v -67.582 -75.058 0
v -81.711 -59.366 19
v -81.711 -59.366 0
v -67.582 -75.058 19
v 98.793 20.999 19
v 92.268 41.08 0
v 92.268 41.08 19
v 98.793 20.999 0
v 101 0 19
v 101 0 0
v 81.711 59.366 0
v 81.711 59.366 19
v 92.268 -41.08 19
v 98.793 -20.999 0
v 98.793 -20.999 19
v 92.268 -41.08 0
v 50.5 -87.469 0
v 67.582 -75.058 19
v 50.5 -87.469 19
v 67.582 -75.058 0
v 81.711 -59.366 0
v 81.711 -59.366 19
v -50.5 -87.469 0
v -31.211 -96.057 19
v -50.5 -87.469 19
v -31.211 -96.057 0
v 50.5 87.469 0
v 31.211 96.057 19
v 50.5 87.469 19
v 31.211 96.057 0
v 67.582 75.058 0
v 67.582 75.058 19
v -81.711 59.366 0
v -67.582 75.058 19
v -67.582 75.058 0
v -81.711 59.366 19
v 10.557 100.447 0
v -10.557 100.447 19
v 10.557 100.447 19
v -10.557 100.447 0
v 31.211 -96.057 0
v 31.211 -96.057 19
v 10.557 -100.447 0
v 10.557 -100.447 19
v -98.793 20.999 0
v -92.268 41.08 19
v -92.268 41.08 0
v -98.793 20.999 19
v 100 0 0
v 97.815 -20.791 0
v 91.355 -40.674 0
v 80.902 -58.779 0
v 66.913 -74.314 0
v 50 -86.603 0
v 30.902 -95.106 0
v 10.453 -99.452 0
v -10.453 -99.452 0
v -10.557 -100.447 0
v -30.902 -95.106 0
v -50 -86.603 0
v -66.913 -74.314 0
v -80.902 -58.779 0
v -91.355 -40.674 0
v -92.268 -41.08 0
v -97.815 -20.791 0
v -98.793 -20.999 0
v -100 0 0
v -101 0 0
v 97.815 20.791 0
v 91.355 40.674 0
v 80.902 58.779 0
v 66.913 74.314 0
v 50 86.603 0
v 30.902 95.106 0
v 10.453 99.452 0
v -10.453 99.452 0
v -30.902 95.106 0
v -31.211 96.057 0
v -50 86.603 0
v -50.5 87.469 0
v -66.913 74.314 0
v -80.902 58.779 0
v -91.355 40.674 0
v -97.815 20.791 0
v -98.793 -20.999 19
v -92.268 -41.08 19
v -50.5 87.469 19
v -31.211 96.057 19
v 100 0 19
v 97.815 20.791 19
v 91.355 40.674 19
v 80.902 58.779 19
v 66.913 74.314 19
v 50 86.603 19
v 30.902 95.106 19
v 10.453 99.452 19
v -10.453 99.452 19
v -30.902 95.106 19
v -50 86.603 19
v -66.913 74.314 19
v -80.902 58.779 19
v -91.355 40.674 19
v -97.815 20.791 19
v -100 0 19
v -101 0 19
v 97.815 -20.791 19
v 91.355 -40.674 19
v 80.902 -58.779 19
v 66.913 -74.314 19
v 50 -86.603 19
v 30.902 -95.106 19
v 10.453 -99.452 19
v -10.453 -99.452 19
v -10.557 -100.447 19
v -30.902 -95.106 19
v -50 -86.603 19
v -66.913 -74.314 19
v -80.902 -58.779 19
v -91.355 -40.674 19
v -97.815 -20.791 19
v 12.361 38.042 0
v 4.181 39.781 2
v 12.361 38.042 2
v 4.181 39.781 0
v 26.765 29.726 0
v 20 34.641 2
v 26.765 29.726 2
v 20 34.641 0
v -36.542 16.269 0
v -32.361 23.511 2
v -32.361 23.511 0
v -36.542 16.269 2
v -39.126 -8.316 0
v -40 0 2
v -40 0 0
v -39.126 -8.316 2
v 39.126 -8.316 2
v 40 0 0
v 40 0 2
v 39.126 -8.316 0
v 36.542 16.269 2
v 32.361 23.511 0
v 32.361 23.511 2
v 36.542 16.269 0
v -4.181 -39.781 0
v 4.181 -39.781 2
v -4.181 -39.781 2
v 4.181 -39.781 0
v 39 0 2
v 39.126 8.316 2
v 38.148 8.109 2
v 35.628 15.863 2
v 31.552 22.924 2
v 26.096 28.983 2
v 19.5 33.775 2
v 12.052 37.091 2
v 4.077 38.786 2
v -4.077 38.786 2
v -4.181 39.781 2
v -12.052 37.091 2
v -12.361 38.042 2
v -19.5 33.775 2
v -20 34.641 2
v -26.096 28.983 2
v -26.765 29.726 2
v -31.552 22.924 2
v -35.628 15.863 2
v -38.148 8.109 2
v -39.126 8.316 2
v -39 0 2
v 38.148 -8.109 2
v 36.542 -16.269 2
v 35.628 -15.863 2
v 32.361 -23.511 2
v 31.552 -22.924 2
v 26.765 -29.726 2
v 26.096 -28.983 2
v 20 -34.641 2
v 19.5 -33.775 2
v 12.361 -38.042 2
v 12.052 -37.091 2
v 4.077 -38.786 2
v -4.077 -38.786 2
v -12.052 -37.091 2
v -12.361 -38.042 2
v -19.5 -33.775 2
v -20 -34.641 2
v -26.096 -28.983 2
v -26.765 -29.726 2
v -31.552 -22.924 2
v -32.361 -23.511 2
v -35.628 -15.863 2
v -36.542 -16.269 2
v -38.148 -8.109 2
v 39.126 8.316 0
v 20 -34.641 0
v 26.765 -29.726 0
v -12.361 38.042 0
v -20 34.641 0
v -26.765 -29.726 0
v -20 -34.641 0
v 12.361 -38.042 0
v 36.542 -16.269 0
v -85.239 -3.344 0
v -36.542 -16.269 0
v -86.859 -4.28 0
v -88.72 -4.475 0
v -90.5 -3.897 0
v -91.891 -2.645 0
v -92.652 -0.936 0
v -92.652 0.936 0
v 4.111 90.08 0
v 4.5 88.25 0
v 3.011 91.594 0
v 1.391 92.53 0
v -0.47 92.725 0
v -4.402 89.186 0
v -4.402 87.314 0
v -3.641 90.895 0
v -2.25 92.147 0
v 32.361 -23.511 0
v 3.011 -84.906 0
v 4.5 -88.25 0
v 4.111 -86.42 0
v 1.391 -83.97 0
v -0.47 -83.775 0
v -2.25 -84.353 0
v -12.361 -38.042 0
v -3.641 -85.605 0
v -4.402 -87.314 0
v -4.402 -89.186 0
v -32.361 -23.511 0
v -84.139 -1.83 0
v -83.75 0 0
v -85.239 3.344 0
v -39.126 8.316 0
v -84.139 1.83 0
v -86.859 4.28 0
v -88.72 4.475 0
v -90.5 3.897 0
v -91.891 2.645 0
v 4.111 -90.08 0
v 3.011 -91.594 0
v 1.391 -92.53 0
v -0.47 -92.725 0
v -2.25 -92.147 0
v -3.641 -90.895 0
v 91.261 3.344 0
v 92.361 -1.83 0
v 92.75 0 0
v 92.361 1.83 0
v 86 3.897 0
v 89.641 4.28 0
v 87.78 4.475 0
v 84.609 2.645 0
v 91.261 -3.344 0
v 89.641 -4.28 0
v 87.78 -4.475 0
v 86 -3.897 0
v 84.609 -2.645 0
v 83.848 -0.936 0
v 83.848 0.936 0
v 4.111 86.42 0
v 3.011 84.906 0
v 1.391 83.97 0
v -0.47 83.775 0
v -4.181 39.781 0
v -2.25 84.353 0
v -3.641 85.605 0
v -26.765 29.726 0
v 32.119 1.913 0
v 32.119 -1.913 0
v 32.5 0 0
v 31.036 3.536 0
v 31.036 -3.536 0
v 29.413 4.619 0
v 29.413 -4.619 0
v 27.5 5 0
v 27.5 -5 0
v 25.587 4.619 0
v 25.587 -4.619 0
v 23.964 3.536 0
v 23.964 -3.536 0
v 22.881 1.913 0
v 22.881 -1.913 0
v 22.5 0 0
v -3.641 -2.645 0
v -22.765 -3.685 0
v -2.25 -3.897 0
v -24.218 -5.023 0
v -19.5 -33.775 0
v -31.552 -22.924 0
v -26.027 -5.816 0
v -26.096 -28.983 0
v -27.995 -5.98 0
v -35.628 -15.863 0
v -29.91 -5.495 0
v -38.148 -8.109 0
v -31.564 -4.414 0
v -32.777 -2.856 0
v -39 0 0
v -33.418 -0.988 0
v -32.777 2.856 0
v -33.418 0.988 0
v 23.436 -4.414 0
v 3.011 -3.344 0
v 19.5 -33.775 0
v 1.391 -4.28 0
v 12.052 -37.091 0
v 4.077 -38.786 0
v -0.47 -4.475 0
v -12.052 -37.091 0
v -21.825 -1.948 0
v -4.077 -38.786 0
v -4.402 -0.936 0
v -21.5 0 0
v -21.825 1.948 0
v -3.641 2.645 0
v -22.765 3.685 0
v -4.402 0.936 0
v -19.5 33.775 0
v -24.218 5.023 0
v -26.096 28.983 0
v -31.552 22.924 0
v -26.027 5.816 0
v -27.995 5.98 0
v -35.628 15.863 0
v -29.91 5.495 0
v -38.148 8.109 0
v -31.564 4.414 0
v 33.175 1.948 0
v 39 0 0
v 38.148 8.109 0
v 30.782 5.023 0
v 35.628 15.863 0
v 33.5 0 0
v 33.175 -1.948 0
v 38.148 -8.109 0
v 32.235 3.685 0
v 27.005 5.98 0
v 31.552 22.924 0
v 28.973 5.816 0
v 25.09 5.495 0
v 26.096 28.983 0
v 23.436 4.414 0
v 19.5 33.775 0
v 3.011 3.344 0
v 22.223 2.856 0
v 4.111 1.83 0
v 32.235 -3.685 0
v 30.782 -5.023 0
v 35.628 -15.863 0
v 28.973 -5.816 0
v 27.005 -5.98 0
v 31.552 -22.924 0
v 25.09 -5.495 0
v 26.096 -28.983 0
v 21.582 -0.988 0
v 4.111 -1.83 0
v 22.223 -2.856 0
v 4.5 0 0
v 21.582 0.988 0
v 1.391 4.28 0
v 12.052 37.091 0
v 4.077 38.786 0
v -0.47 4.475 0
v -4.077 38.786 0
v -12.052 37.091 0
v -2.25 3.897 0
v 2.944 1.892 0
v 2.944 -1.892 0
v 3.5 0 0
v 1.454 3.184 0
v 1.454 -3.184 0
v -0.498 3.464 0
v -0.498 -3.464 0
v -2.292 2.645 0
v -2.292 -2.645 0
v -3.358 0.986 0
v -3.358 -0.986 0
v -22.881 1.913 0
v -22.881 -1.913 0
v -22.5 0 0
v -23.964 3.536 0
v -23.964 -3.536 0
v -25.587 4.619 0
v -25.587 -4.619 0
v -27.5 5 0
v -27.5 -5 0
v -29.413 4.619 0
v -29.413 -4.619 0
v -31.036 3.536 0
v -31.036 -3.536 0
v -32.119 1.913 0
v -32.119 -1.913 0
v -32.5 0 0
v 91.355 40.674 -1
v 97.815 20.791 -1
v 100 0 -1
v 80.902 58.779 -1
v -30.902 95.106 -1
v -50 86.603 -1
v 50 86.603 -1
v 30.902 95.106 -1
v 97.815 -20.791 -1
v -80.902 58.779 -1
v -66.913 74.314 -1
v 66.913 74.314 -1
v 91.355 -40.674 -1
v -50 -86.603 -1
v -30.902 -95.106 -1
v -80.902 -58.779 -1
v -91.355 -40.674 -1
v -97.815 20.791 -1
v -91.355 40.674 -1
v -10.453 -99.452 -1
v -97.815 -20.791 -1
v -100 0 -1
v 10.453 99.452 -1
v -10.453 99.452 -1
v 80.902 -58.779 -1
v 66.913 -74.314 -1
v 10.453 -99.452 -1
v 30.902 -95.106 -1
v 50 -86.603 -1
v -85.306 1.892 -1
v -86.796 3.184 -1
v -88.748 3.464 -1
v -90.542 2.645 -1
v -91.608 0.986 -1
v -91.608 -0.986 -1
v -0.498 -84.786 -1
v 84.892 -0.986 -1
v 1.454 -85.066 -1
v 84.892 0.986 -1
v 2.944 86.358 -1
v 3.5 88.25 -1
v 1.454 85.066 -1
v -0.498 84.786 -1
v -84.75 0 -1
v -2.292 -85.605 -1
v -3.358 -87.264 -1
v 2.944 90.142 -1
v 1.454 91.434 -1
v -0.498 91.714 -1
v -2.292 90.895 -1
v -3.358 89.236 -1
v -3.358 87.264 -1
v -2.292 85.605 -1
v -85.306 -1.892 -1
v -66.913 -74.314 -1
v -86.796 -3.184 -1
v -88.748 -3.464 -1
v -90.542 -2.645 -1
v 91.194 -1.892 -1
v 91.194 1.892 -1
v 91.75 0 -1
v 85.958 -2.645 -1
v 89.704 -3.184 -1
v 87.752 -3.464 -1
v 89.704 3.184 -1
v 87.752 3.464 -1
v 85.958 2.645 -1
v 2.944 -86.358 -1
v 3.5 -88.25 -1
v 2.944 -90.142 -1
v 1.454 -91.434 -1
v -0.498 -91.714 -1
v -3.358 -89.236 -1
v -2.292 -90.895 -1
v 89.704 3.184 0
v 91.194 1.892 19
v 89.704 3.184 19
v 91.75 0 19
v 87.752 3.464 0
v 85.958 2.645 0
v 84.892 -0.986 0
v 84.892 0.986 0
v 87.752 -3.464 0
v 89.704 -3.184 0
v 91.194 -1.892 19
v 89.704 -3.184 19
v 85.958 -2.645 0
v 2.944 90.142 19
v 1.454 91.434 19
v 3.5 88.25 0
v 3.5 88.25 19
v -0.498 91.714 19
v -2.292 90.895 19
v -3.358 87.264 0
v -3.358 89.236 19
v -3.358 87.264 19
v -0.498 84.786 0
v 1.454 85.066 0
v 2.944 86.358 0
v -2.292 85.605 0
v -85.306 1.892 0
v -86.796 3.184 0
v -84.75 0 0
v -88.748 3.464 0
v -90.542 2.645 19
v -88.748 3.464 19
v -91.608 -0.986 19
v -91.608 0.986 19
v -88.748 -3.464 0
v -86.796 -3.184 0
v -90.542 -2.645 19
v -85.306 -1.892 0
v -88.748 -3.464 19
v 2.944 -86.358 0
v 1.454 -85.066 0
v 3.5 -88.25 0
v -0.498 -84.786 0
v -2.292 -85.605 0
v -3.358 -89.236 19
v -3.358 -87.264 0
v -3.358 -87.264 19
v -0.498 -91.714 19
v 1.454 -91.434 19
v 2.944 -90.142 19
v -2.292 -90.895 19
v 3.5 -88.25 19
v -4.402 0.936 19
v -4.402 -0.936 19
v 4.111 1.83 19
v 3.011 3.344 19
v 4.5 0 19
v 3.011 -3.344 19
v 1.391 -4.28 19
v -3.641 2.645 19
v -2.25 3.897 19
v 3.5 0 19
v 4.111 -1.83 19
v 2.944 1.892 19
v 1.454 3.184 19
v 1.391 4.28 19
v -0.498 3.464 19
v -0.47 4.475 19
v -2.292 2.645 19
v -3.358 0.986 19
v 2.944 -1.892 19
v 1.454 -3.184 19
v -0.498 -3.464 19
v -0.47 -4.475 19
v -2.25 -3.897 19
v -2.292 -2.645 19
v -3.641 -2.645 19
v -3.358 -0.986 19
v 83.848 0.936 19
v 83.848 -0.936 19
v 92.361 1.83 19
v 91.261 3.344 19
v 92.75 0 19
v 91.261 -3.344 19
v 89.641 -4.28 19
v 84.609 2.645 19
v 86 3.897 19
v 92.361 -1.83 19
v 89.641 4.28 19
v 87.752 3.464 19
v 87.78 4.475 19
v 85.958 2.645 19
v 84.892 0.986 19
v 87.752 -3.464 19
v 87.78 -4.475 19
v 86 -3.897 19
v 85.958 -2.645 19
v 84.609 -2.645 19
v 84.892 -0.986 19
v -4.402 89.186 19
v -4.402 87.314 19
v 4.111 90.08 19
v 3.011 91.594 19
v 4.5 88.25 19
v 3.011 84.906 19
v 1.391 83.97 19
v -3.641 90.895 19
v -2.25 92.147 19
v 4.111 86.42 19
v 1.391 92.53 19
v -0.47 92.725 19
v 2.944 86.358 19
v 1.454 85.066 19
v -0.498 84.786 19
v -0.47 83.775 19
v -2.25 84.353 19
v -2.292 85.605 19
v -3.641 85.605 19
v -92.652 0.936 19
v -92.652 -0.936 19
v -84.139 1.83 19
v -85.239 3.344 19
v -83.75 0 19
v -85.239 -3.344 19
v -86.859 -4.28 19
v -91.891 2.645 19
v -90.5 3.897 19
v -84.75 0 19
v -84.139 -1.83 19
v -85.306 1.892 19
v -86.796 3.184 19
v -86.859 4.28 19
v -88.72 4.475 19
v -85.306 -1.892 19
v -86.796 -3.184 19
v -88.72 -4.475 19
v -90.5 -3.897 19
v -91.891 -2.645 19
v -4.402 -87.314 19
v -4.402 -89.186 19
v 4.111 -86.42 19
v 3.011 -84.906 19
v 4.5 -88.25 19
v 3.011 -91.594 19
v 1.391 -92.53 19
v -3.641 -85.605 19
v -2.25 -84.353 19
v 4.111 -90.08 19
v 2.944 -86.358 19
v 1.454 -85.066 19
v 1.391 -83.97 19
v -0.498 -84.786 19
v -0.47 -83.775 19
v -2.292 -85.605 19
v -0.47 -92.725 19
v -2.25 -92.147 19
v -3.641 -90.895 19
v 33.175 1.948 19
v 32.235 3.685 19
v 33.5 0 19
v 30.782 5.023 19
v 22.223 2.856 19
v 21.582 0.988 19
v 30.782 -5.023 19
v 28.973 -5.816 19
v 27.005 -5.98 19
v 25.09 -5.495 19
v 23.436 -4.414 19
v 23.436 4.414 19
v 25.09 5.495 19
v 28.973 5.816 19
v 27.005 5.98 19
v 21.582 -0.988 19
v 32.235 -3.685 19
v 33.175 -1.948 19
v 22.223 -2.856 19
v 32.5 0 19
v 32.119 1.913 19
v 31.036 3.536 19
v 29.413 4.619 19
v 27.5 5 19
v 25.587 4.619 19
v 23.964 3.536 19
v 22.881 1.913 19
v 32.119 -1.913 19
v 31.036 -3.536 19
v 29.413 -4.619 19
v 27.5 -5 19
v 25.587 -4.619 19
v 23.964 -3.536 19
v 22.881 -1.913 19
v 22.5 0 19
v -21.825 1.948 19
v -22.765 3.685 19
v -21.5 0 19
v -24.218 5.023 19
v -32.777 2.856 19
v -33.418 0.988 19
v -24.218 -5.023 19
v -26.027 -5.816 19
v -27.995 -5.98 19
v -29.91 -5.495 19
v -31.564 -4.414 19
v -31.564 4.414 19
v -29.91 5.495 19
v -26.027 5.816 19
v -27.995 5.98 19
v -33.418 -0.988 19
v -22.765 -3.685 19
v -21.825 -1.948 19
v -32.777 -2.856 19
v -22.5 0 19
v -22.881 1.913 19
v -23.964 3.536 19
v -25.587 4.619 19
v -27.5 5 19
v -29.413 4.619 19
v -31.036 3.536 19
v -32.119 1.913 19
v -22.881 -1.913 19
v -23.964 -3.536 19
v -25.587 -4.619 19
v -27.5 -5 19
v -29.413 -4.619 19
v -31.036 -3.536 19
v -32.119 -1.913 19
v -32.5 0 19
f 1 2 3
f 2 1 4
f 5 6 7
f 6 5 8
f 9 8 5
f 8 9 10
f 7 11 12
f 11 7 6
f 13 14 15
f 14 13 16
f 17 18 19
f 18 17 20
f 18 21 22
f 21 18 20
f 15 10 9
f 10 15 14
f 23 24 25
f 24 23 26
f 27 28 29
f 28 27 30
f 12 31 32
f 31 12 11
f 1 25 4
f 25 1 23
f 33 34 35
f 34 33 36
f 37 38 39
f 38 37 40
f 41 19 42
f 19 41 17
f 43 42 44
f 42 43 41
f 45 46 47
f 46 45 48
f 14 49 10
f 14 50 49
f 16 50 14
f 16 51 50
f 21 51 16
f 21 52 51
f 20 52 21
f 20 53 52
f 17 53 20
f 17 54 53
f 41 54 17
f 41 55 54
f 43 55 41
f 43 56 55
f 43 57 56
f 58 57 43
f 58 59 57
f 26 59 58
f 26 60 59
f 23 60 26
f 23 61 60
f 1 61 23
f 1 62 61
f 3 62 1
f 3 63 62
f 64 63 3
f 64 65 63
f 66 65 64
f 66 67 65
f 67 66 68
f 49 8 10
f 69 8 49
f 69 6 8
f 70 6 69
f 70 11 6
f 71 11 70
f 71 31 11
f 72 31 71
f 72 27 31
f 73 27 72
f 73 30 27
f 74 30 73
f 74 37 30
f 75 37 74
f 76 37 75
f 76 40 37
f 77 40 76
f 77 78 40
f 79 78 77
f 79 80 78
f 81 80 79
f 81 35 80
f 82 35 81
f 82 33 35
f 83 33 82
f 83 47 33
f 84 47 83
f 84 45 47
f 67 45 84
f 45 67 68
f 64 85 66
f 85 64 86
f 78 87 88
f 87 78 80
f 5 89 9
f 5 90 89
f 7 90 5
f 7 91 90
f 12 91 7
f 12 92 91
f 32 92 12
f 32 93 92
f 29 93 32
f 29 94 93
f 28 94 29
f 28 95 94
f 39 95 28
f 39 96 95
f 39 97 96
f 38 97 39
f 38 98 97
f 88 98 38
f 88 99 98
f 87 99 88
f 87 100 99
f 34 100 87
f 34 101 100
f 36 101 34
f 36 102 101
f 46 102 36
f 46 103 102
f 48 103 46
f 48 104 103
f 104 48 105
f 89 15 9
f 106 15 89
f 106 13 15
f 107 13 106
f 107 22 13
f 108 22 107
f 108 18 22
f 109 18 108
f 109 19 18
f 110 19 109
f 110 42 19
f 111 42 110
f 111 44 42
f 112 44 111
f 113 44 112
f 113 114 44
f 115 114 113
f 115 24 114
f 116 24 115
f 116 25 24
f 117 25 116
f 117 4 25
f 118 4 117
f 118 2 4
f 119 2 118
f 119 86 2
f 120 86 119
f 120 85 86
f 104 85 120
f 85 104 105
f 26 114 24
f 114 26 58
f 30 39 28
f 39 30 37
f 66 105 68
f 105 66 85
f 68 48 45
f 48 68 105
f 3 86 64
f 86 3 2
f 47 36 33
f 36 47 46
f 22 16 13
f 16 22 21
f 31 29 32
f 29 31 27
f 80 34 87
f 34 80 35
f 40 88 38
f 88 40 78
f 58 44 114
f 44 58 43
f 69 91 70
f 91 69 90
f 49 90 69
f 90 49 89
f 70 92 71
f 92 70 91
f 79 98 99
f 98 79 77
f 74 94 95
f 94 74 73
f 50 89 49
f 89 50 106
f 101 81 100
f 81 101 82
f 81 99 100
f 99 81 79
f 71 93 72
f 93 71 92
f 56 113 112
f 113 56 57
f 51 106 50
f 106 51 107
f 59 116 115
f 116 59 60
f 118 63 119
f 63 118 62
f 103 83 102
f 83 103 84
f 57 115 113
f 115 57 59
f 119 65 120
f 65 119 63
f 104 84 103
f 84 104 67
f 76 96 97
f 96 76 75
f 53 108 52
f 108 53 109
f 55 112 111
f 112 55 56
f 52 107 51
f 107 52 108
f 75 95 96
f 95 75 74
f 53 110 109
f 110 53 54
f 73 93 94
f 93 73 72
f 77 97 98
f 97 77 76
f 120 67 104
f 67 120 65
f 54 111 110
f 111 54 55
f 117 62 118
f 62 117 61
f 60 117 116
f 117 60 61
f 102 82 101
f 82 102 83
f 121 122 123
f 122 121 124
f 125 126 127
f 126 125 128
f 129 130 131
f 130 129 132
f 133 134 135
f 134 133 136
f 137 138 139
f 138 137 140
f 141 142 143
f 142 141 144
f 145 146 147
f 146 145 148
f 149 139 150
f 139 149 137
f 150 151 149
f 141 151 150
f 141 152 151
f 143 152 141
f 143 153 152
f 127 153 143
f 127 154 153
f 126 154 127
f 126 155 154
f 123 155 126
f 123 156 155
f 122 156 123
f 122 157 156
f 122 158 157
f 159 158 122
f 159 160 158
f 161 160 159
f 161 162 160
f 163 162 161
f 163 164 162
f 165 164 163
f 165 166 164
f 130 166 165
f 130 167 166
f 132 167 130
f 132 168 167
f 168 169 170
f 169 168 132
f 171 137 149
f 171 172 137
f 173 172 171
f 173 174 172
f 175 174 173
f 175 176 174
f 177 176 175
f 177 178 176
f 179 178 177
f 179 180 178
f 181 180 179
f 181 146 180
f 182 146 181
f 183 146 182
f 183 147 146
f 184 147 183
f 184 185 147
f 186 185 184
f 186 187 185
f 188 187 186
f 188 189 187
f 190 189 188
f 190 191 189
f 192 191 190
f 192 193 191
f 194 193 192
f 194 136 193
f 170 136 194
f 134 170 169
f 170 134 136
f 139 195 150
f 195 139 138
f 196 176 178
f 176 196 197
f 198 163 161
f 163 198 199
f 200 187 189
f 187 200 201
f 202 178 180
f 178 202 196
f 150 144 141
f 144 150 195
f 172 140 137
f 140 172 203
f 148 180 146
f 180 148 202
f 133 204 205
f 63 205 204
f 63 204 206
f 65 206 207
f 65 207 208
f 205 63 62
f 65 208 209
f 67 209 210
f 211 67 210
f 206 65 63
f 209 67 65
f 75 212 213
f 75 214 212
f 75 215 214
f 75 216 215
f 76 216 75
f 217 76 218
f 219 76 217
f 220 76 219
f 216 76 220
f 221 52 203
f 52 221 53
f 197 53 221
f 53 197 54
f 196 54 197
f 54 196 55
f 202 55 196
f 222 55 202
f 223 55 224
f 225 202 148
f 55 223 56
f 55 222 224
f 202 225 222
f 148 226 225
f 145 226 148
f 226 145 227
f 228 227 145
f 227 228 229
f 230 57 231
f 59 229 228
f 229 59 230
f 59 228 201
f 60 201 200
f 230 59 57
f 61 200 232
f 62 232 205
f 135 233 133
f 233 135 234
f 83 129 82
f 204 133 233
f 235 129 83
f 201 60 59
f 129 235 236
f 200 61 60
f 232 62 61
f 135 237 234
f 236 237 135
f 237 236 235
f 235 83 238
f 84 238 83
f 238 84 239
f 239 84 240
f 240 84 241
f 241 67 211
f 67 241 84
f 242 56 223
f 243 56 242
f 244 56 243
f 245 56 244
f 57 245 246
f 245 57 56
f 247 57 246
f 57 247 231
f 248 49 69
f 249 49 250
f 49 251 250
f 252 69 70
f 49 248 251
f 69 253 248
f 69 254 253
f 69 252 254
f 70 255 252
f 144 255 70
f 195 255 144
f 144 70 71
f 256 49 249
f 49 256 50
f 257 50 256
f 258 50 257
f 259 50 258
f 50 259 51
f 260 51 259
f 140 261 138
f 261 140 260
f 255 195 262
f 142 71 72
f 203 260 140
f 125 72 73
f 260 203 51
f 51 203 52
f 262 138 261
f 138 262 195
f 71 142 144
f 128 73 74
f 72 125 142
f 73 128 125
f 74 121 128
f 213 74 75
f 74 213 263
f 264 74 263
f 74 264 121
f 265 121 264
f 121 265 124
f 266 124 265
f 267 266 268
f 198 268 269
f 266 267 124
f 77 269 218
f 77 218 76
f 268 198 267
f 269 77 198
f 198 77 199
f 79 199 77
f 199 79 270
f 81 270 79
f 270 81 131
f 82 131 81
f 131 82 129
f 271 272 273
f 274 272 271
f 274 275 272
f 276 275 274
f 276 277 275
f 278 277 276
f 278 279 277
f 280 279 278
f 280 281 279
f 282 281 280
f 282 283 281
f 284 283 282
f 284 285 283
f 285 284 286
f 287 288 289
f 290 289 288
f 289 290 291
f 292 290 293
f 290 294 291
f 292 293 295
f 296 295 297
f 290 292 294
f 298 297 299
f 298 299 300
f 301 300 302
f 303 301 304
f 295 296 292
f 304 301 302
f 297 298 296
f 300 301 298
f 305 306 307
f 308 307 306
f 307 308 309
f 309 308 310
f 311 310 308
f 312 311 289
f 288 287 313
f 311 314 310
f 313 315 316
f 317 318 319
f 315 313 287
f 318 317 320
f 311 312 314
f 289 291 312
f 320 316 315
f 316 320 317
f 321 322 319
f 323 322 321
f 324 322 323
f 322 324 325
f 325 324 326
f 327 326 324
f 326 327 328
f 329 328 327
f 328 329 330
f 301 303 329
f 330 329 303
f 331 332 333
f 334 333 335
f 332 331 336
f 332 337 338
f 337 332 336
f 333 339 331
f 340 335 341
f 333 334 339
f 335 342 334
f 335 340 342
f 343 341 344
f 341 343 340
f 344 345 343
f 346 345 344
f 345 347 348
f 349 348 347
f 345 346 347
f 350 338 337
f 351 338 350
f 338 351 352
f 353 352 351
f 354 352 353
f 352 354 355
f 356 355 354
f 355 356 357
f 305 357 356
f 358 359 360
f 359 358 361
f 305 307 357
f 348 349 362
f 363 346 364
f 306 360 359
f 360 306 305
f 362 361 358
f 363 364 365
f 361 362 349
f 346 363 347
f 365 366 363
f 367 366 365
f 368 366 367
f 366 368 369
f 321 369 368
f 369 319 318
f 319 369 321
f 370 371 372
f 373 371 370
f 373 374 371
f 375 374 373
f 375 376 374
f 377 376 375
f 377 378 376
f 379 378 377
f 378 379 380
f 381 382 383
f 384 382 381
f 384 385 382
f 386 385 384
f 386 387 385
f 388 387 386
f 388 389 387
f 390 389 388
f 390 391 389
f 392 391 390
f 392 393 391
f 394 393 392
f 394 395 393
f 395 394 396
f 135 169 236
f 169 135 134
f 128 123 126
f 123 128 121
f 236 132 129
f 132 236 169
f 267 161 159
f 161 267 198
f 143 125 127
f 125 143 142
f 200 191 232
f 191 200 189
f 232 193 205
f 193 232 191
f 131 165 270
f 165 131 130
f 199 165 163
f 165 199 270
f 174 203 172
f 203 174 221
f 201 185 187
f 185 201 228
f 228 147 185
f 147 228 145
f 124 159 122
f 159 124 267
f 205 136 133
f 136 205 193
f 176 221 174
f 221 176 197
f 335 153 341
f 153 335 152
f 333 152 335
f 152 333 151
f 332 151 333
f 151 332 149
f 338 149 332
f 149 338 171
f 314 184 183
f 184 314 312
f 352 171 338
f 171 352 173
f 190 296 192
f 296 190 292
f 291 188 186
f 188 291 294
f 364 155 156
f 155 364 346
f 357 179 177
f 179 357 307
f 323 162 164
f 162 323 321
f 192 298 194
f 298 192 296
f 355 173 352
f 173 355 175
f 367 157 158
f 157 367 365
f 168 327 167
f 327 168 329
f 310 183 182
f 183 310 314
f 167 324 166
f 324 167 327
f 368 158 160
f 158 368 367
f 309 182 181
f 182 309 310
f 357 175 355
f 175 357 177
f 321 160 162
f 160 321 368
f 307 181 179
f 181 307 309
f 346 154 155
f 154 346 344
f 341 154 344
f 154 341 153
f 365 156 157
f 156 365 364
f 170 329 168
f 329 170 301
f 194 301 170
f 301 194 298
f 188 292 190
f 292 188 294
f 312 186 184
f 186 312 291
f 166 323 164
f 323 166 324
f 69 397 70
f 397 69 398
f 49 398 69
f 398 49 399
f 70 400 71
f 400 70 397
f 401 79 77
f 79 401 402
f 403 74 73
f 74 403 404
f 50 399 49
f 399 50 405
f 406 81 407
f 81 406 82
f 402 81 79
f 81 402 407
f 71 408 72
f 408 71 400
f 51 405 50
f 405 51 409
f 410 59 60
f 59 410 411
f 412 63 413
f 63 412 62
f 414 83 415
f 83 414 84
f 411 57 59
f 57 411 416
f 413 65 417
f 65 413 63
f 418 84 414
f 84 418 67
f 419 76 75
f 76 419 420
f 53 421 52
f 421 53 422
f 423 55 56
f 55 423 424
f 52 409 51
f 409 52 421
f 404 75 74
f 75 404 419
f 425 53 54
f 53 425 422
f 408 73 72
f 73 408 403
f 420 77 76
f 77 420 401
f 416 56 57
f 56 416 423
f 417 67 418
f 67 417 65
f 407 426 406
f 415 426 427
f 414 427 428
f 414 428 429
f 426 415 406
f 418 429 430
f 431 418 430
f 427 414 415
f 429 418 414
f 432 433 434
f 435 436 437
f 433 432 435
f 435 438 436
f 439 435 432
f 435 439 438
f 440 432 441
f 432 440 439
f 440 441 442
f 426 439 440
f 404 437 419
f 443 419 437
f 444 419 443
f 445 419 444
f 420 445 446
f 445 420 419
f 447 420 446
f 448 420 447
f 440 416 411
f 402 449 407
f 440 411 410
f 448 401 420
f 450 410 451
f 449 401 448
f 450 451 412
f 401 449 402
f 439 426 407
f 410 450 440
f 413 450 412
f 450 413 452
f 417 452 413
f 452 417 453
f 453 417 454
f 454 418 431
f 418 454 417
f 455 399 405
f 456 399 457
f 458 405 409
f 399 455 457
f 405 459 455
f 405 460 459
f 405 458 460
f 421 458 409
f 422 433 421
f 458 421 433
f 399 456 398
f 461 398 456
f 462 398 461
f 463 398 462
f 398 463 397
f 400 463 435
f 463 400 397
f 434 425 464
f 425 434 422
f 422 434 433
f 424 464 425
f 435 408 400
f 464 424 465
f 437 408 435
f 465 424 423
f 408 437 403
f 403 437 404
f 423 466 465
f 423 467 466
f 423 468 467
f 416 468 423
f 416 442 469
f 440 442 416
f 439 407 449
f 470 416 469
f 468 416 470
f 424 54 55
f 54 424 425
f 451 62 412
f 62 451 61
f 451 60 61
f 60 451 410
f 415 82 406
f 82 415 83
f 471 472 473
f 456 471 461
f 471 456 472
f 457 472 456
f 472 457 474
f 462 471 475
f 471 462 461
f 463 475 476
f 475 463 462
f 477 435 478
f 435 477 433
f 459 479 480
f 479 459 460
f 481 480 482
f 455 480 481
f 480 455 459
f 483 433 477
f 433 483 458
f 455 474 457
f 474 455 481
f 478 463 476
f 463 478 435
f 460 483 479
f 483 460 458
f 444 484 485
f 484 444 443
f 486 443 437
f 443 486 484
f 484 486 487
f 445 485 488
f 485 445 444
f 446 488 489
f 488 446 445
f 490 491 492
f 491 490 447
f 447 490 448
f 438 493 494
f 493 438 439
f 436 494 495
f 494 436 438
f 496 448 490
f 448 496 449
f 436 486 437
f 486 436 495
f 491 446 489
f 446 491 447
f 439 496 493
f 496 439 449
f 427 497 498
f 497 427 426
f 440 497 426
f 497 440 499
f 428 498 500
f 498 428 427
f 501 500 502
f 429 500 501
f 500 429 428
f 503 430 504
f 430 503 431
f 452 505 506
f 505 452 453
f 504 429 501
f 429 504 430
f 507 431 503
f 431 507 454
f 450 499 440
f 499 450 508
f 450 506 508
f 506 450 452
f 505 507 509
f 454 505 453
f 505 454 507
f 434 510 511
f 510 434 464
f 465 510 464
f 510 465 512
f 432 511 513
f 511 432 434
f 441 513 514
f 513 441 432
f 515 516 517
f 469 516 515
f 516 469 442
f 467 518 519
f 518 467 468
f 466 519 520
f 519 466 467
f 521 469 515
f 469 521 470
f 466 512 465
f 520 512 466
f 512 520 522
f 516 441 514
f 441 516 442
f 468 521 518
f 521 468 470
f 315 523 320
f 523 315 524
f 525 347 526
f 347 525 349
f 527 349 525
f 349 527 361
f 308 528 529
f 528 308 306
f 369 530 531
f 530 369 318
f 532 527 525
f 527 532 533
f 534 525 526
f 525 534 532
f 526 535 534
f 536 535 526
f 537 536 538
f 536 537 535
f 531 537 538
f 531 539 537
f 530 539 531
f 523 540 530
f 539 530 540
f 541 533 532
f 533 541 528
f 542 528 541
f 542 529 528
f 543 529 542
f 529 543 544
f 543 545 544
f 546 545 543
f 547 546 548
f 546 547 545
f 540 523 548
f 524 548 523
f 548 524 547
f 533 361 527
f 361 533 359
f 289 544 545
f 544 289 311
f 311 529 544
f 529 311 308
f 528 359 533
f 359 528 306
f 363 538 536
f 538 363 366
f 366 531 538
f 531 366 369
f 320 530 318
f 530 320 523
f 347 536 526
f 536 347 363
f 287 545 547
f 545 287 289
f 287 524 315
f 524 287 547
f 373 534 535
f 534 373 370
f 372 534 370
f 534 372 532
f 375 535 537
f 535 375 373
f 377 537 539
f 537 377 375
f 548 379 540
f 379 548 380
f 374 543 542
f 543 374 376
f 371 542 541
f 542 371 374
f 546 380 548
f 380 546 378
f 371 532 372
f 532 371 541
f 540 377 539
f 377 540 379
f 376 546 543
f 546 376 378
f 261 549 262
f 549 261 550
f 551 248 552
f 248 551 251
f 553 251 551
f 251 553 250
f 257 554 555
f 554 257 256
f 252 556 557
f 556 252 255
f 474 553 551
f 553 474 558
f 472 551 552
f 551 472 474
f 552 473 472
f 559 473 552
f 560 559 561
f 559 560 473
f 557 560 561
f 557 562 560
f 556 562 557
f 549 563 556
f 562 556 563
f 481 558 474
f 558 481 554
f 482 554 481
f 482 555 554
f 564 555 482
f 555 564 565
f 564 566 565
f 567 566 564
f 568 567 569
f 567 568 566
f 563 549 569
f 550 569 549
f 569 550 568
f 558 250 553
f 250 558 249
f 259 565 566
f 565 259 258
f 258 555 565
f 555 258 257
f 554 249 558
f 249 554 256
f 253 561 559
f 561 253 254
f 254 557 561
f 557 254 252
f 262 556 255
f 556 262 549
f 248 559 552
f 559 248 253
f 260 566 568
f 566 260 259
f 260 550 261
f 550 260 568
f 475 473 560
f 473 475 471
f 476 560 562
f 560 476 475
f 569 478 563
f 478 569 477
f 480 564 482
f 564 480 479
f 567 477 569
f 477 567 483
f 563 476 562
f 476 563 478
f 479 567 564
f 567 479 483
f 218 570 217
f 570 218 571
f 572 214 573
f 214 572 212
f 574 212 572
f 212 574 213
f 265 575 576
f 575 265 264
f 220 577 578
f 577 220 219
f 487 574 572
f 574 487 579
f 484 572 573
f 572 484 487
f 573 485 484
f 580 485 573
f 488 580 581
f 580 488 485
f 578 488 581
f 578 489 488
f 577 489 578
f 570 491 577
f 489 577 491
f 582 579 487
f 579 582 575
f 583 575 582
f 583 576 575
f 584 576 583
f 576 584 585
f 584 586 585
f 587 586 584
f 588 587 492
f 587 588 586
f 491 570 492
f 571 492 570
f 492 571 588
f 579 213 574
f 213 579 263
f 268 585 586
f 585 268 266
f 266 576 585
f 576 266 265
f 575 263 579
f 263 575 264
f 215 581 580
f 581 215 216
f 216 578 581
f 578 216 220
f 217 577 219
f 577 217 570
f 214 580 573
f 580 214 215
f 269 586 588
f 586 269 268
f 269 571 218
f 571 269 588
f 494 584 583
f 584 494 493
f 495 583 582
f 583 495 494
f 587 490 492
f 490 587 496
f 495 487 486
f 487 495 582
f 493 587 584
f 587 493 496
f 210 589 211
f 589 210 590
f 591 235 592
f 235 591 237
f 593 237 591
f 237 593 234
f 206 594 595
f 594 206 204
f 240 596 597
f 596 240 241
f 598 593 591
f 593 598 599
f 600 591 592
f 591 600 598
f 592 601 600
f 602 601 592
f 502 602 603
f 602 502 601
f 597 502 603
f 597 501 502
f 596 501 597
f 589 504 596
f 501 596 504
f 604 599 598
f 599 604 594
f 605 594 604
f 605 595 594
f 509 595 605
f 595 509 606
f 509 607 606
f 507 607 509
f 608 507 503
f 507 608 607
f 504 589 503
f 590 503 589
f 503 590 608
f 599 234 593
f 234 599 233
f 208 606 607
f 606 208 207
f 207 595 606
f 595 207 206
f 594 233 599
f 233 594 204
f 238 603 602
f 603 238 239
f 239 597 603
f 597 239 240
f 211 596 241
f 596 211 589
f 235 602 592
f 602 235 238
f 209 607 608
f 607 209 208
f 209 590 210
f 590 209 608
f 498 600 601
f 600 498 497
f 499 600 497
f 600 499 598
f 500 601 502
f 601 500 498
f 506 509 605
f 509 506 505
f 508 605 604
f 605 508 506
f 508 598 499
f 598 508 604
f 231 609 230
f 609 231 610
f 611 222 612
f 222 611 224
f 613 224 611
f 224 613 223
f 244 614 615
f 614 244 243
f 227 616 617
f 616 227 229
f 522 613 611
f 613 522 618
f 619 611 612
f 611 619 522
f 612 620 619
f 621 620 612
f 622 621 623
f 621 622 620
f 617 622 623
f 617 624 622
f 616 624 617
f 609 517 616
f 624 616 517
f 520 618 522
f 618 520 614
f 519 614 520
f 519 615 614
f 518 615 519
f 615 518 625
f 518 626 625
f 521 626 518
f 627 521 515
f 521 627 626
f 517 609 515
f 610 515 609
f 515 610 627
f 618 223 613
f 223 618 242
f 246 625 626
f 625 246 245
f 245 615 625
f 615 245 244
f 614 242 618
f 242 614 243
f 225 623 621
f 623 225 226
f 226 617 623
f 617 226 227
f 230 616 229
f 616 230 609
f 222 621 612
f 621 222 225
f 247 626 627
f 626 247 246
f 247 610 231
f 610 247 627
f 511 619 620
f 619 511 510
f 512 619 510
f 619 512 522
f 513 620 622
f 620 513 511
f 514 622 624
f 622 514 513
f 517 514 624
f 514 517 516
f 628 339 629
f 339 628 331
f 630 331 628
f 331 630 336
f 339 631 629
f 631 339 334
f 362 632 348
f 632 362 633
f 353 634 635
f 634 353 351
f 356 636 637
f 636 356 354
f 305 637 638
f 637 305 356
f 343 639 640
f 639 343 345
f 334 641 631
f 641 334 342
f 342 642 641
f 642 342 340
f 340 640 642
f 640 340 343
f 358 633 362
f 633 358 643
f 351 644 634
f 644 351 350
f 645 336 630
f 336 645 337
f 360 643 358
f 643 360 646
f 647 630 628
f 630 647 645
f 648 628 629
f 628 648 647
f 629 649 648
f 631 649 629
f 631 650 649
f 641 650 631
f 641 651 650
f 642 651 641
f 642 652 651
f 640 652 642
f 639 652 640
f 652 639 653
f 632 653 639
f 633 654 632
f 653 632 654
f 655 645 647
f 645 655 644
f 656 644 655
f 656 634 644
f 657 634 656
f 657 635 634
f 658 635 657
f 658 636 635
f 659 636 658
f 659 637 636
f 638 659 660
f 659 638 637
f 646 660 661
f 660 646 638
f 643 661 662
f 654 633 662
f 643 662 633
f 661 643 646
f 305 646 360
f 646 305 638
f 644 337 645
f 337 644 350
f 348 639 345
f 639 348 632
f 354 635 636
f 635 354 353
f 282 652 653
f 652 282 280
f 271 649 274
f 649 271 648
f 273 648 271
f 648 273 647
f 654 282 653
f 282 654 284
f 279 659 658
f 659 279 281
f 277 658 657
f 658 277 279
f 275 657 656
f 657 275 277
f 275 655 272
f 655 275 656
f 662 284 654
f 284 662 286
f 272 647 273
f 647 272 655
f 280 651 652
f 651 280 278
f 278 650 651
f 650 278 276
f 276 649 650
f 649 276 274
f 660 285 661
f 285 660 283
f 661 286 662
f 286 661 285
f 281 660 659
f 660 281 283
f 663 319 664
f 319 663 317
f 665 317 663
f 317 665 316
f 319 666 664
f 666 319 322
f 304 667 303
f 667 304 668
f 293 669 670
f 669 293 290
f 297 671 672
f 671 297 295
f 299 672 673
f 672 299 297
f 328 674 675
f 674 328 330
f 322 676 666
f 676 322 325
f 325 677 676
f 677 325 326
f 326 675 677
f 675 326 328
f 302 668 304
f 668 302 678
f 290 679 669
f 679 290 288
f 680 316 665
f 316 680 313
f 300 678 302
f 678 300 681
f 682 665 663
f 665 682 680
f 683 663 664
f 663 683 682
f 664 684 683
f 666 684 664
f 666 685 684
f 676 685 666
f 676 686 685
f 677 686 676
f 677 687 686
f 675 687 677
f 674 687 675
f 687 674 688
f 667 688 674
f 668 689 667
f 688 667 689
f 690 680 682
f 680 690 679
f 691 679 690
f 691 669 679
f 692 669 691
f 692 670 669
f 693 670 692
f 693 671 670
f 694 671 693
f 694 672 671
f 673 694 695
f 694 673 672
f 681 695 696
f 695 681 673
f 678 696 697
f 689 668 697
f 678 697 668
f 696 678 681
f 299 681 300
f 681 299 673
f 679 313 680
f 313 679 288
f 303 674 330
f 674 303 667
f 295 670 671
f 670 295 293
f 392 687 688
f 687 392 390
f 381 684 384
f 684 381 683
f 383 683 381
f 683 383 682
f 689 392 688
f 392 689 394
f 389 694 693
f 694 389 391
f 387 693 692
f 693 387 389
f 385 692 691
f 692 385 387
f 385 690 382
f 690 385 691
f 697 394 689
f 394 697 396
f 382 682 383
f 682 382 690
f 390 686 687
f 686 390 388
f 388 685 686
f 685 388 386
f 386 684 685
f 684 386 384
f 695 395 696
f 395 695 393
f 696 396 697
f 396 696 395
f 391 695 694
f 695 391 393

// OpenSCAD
radius = 100;
outerBorderThickness = 1;

innerRadius = 39;
innerBorderThickness = 1;

bottomThickness = 1;
height = 20 - bottomThickness;



holeDistanceFromSide = 10;
guiderRodDistanceFromMiddle = 30;


rodBorderThickness = 1;
threadedRodRadius = 3.5;
guiderRodRadius = 5;







// Main frame
pillar(radius, outerBorderThickness, height);
pillar(innerRadius, innerBorderThickness, 2);

// Bottom plate
difference() {
    translate([0, 0, -bottomThickness]) {
        cylinder(bottomThickness, radius, radius);
    }

    translate([radius - holeDistanceFromSide - threadedRodRadius / 2, 0,-bottomThickness]) {
        cylinder(bottomThickness, threadedRodRadius, threadedRodRadius);
    }
    translate([0, radius - holeDistanceFromSide - threadedRodRadius / 2, -bottomThickness]) {
        cylinder(bottomThickness, threadedRodRadius, threadedRodRadius);
    }

    translate([-(radius - holeDistanceFromSide - threadedRodRadius / 2), 0, -bottomThickness]) {
        cylinder(bottomThickness, threadedRodRadius, threadedRodRadius);
    }

    translate([0, -(radius - holeDistanceFromSide - threadedRodRadius / 2), -bottomThickness]) {
        cylinder(bottomThickness, threadedRodRadius, threadedRodRadius);
    }
}



// Structural threaded rods
translate([radius - holeDistanceFromSide - threadedRodRadius / 2, 0, 0]) {
    pillar(threadedRodRadius, rodBorderThickness, height);
}

translate([0, radius - holeDistanceFromSide - threadedRodRadius / 2, 0]) {
    pillar(threadedRodRadius, rodBorderThickness, height);
}

translate([-(radius - holeDistanceFromSide - threadedRodRadius / 2), 0, 0]) {
    pillar(threadedRodRadius, rodBorderThickness, height);
}

translate([0, -(radius - holeDistanceFromSide - threadedRodRadius / 2), 0]) {
    pillar(threadedRodRadius, rodBorderThickness, height);
}



// Guiders

translate([guiderRodDistanceFromMiddle - guiderRodRadius / 2, 0, 0]) {
    pillar(guiderRodRadius, rodBorderThickness, height);
}

translate([-guiderRodDistanceFromMiddle + guiderRodRadius / 2, 0, 0]) {
    pillar(guiderRodRadius, rodBorderThickness, height);
}


// Moving threaded rod
pillar(threadedRodRadius, rodBorderThickness, height);







module pillar(innerRadius, thickness, height) {
    difference() {
        cylinder(height, innerRadius + thickness, innerRadius + thickness);
        cylinder(height, innerRadius, innerRadius);
    }
}
/*


  
module segment(innerWidth = 50) {
    
    cube([holeDepth + deviderDepth, (outerWidth - innerWidth) / 2, height]);

    translate([0, 0, 0])
      cube([deviderDepth, outerWidth, height]);
  

    translate([0, outerWidth - (outerWidth - innerWidth) / 2, 0])
       cube([holeDepth + deviderDepth, (outerWidth - innerWidth) / 2, height]);

}


segments = 72;
sidePatternDomain = 15;

smallSegmentWidth = 10;
mediumSegmentWidth = 40;
largeSegmentWidth = 90;
// middel = 13
// klein = 9

for (i = [0:1:segments]) 
{   
    translate([i * (deviderDepth + holeDepth), 0, 0]) {
        
        if (i > sidePatternDomain && i < segments - sidePatternDomain)
        {
            if (i % 2 == 0) 
            {
                if (i % 3 == 0)
                {
                    segment(mediumSegmentWidth);
                } else {
                    segment(largeSegmentWidth);
                }
            } else {
                if (i % 3 == 0)
                {
                    segment(mediumSegmentWidth);
                } else { 
                    segment(smallSegmentWidth);
                }
            }
        } else {
            if (i % 2 == 1) //(i < segments / 2 ? 1 : 0)) 
            {
                segment(smallSegmentWidth);
            } else {
                segment(largeSegmentWidth);
            }
        }
        
    }
}

translate([(segments + 1) * (deviderDepth + holeDepth), 0, 0])
    cube([borderDepth, outerWidth, height]);

translate([-borderDepth + deviderDepth, 0, 0])
    cube([borderDepth - deviderDepth, outerWidth, height]);
    
    
    */
